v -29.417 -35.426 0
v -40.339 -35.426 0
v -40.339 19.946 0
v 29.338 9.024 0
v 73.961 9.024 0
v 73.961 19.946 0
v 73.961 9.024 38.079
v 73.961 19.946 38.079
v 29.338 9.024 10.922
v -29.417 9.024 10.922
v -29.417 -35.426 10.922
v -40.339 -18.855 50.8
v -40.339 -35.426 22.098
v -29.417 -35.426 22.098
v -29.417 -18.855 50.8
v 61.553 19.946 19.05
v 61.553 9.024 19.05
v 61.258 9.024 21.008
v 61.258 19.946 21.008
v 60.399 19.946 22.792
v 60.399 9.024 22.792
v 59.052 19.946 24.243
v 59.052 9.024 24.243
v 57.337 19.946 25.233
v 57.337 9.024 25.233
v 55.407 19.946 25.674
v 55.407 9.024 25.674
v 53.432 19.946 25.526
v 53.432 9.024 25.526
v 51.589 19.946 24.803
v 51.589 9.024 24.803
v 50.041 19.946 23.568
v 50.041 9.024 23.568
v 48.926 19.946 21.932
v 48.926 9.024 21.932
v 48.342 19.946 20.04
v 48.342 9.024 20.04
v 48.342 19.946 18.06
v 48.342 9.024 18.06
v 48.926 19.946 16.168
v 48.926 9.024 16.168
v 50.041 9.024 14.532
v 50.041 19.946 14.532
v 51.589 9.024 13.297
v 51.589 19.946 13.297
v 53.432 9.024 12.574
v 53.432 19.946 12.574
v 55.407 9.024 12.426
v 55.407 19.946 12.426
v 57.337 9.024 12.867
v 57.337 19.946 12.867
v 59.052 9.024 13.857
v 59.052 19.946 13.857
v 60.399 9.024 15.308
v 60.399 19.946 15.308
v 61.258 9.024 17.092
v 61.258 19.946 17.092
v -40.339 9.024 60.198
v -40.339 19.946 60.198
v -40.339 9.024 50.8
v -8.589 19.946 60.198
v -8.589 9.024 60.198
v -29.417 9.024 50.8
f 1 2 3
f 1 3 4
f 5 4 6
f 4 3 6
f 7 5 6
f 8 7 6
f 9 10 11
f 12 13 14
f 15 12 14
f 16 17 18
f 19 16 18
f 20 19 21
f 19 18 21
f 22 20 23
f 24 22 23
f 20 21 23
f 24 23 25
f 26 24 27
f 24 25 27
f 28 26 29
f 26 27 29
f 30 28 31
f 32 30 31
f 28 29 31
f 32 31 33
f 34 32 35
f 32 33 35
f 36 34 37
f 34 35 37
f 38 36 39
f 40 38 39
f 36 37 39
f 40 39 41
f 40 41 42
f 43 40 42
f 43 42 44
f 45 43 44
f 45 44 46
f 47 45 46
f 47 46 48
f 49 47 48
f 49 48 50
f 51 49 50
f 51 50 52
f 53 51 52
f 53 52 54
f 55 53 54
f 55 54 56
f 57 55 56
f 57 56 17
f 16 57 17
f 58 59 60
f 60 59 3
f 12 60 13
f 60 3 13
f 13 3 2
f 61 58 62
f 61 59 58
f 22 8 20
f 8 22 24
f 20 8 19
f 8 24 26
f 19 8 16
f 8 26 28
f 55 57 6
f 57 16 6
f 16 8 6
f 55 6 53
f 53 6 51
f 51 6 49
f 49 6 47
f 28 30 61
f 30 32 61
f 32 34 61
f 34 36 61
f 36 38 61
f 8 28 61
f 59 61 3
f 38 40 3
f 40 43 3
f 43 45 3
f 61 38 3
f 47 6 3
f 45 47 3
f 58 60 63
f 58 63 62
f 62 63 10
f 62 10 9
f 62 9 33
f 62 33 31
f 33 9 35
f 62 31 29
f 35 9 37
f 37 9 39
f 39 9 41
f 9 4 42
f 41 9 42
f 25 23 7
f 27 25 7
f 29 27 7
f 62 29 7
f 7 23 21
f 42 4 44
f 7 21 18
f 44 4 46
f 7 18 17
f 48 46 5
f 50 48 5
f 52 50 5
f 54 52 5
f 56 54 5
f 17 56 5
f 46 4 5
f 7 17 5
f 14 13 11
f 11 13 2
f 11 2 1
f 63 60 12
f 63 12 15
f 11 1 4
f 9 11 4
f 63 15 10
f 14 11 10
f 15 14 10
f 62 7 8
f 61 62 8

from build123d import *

# Parameters (mm, degrees)
F1_DEPTH = 60.198
F0_W     = 10.922
F0_H     = 16.735694
F0_H_2   = 27.714306
F2_DEPTH = 50.8
F3_DEPTH = 10.922
F4_R     = 6.642507
F5_DEPTH = 10.923
F6_SIZE2 = 16.571107
F6_SIZE  = 28.702
F7_SIZE2 = 22.119206
F7_SIZE  = 82.55


with BuildPart() as f1:
    # F0 (on Top) → F1 (new body)
    with BuildSketch(Plane.XY):
        Polygon((-8.589479, 19.945886), (-40.339479, 19.945886), (-40.339479, 9.023886), (-29.417479, 9.023886), (-8.589479, 9.023886), align=None)
        Polygon((73.960521, 19.945886), (-8.589479, 19.945886), (-8.589479, 9.023886), (29.338112, 9.023886), (73.960521, 9.023886), align=None)
    extrude(amount=F1_DEPTH)

    # F0 (on Top) → F2 (join)
    with BuildSketch(Plane.XY):
        with Locations((-34.878479, 0.656039)):
            Rectangle(F0_W, F0_H)
        with Locations((-34.878479, -21.568961)):
            Rectangle(F0_W, F0_H_2)
    extrude(amount=F2_DEPTH)

    # F0 (on Top) → F3 (join)
    with BuildSketch(Plane.XY):
        Polygon((29.338112, 9.023886), (-8.589479, 9.023886), (-29.417479, 9.023886), (-29.417479, -7.711808), (-29.417479, -35.426114), align=None)
    extrude(amount=F3_DEPTH)

    # F4 (on face) → F5 (cut, through all)
    with BuildSketch(Plane.XZ.offset(-9.023886)):
        with Locations((54.910521, 19.05)):
            Circle(F4_R)
    extrude(amount=-F5_DEPTH, mode=Mode.SUBTRACT)

    # F6
    f6_edges = [f1.edges().sort_by_distance(p)[0] for p in [
        (-34.878479, -35.426114, 50.8),
    ]]
    chamfer(f6_edges, length=F6_SIZE, length2=F6_SIZE2)

    # F7
    f7_edges = [f1.edges().sort_by_distance(p)[0] for p in [
        (73.960521, 14.484886, 60.198),
    ]]
    chamfer(f7_edges, length=F7_SIZE, length2=F7_SIZE2)


solid = f1.part
